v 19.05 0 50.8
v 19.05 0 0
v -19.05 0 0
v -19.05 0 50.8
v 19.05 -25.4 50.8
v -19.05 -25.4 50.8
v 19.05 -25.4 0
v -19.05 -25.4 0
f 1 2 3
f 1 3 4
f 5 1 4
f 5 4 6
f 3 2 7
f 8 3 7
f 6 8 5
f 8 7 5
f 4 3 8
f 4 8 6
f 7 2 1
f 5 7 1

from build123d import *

# Parameters (mm, degrees)
F0_W     = 25.4
F0_H     = 50.8
F1_DEPTH = 25.4
F2_ANGLE = 90
F3_DEPTH = 12.7


# Not quite as in the source:
# - the program builds the solid bodies; features that only make, move or delete a surface that nothing else refers to are left out


with BuildPart() as f1:
    # F0 (on Top) → F1 (new body)
    with BuildSketch(Plane.XY):
        with Locations((12.7, 25.4)):
            Rectangle(F0_W, F0_H)
    extrude(amount=F1_DEPTH)


with BuildPart() as f1_1:
    # F2: moved
    add(f1.part.rotate(Axis((12.7, 0, 0), (1, 0, 0)), F2_ANGLE))

    # F3 (add): a face of the model
    f3_faces = [f1_1.faces().sort_by_distance(p)[0] for p in [
        (0, -12.7, 25.4),
    ]]
    extrude(f3_faces, amount=F3_DEPTH)


with BuildPart() as f1_2:
    # F5: moved
    add(f1_1.part.moved(Location((-6.35, 0, 0))))


solid = f1_2.part
